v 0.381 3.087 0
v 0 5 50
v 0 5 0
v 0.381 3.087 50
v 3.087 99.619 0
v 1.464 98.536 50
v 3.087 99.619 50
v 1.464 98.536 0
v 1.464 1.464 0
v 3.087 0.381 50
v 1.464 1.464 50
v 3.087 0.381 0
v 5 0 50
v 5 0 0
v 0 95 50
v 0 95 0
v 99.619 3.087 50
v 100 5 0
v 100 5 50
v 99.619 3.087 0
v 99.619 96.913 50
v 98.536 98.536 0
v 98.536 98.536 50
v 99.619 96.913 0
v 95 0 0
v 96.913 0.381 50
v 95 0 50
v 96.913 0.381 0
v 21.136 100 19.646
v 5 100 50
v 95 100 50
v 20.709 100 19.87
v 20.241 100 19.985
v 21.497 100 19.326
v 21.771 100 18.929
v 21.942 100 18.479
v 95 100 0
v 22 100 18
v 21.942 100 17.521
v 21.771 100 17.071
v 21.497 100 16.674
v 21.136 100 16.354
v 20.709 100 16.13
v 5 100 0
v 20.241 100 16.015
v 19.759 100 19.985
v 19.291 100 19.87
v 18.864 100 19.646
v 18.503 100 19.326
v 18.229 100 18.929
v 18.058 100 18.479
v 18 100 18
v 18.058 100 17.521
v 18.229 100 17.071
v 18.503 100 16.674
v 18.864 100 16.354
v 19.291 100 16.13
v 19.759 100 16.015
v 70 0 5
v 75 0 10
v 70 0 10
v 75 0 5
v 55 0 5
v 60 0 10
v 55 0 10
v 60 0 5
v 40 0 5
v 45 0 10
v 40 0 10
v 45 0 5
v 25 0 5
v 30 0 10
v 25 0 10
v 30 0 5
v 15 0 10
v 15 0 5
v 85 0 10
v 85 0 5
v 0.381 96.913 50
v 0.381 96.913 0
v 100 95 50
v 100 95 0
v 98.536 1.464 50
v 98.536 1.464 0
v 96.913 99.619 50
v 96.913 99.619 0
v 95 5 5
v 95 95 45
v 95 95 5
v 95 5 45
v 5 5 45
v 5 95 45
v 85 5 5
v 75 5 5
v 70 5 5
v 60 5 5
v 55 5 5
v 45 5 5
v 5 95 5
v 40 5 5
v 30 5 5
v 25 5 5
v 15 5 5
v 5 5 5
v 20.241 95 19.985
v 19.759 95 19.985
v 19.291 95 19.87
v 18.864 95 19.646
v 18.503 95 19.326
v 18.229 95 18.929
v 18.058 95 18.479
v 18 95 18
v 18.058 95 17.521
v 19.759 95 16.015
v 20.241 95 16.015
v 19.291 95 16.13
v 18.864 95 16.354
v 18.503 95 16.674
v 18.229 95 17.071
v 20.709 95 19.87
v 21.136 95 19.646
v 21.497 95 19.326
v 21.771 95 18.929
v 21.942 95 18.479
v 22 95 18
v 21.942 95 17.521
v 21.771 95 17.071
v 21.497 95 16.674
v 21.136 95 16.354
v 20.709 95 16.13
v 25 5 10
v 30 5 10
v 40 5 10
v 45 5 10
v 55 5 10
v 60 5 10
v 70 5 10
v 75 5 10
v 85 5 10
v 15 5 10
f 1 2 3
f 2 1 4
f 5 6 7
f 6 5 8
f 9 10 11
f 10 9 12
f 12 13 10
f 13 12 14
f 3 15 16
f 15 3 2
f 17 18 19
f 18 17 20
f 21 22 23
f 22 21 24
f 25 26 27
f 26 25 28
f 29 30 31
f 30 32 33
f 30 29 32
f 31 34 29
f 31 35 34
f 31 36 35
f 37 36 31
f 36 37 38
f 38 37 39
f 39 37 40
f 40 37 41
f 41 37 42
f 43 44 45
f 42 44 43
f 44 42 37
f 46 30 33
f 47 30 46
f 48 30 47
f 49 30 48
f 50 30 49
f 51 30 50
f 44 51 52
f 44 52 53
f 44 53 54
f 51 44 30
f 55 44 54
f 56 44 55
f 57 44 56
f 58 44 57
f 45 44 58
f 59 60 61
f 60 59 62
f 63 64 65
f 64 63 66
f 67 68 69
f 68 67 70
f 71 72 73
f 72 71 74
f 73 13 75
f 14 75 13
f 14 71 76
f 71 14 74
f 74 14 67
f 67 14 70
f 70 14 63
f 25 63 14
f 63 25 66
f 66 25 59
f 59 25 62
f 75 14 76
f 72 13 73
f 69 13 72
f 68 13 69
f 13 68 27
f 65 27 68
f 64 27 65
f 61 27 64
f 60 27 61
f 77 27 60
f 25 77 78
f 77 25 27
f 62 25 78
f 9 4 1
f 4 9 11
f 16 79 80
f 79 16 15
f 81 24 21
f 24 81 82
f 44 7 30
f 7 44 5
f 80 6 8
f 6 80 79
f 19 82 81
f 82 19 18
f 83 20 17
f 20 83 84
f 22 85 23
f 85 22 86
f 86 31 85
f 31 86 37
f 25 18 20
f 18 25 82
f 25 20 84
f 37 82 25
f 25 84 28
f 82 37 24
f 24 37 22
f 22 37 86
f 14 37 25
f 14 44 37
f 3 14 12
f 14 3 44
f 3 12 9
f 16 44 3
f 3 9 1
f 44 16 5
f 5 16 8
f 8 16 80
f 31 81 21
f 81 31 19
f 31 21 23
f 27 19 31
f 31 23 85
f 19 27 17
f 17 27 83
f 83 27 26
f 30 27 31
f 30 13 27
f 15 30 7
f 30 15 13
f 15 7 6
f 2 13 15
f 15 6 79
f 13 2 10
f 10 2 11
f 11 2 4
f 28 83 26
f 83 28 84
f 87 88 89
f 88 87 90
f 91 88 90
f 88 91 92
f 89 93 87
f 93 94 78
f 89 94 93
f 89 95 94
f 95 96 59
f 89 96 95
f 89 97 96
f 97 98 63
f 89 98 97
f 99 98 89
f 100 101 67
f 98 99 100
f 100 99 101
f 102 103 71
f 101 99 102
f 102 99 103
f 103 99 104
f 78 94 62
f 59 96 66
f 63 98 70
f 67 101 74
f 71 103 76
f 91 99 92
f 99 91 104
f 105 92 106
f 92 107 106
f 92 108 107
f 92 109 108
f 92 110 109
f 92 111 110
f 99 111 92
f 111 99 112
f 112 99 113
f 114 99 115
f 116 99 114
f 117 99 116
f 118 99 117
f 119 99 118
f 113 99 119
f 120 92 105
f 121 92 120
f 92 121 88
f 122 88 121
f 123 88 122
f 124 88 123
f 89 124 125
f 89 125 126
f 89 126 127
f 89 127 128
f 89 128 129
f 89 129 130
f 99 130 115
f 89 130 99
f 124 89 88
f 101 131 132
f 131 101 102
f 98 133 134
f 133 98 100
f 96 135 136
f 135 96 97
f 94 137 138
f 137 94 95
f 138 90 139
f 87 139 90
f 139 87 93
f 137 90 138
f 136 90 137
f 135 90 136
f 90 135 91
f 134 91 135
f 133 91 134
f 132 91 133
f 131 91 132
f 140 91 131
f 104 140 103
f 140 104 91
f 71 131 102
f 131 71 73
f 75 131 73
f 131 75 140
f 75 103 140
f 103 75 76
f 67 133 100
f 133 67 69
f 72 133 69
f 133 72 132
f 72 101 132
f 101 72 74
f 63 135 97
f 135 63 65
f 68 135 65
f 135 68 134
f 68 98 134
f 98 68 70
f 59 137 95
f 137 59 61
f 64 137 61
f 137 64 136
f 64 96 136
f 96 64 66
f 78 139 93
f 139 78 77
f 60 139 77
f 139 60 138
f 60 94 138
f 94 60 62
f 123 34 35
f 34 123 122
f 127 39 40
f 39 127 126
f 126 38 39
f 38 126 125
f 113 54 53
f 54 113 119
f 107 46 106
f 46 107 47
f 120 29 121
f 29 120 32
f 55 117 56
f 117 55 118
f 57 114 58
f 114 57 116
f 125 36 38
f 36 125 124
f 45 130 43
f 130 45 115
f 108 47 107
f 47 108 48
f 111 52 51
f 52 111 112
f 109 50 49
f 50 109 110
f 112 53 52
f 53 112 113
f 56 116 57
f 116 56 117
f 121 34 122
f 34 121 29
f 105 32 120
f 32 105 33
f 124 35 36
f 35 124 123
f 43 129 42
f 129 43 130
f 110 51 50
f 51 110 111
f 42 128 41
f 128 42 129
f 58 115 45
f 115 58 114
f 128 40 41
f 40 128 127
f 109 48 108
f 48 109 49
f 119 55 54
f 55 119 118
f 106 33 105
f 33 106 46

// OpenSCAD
difference() {
    difference() {
        main();
        translate ([0, 0, 5]) {
            plant_adapters();
        }
    }
    translate([20, 95, 18]) {
        solar_power_in();
    }
}

power_adapter = 5;

///////////////////
// Plant Adapter //
///////////////////
module plant_adapters() {
    adapter_width = 10;
    count = 5;
    space = 5;
    max_width = 100;
    
    width = (space * (count - 1)) + (adapter_width * 5);
    offset = (max_width - width) / 2;
    
    union() {
        for ( i = [0:4] ) {
            translate([((adapter_width + space) * i) + offset, 0, 0]) {
                plant_adapter();
            }
        }
    }
    
}

module plant_adapter() {
    height = 5;
    length = 10;
    width = 24;
    
    cube([length, width, height]);  
}

//////////
// Case //
//////////
module main() {
    translate ([5, 5, 0]) {
        difference()
        {
            main_positiv();
            main_negativ();
        }
    }
}

module main_negativ() {
    translate ([0, 0, 5]) {
        cube([90, 90, 40]);
    }
}

module main_positiv() {
    minkowski() {
        cube([90, 90, 45]);
        cylinder(r=5,h=5);
    }
}

/////////
// ESP //
/////////
module esp() {
    height = 8;
    length = 58 + power_adapter;
    width = 29;
    
    translate ([-power_adapter, 0, 0]) {
        cube([length, width, height]);  
    }
}

///////////
// SOLAR //
///////////
module solar_power_in() {
    r = 2;
    y = 10;
    
    translate ([0, 0, 0]) {
        rotate ([270,0,0]) {
            cylinder(h = y, r=r, $fa=0.5, $fs=0.5);
        }
    }
}
//module solar() {
//    difference()
//    {
//        solar_cube();
//        solar_power_in();
//    }
//}
//
//module solar_cube() {
//    height = 25;
//    length = 65 + power_adapter;
//    width = 56;
//    
//    translate ([-power_adapter, 0, 0]) {
//        cube([length, width, height]);  
//    }
//}
//
//module solar_power_in() {
//    r = 2;
//    y = 8;
//    
//    // offset to the middle
//    offset_z = 13;
//    offset_y = -(y / 2);
//    offset_x = 55;
//    
//    translate ([offset_x, offset_y, offset_z]) {
//        rotate ([270,0,0]) {
//            cylinder(h = y, r=r, $fa=0.5, $fs=0.5);
//        }
//    }
//}
